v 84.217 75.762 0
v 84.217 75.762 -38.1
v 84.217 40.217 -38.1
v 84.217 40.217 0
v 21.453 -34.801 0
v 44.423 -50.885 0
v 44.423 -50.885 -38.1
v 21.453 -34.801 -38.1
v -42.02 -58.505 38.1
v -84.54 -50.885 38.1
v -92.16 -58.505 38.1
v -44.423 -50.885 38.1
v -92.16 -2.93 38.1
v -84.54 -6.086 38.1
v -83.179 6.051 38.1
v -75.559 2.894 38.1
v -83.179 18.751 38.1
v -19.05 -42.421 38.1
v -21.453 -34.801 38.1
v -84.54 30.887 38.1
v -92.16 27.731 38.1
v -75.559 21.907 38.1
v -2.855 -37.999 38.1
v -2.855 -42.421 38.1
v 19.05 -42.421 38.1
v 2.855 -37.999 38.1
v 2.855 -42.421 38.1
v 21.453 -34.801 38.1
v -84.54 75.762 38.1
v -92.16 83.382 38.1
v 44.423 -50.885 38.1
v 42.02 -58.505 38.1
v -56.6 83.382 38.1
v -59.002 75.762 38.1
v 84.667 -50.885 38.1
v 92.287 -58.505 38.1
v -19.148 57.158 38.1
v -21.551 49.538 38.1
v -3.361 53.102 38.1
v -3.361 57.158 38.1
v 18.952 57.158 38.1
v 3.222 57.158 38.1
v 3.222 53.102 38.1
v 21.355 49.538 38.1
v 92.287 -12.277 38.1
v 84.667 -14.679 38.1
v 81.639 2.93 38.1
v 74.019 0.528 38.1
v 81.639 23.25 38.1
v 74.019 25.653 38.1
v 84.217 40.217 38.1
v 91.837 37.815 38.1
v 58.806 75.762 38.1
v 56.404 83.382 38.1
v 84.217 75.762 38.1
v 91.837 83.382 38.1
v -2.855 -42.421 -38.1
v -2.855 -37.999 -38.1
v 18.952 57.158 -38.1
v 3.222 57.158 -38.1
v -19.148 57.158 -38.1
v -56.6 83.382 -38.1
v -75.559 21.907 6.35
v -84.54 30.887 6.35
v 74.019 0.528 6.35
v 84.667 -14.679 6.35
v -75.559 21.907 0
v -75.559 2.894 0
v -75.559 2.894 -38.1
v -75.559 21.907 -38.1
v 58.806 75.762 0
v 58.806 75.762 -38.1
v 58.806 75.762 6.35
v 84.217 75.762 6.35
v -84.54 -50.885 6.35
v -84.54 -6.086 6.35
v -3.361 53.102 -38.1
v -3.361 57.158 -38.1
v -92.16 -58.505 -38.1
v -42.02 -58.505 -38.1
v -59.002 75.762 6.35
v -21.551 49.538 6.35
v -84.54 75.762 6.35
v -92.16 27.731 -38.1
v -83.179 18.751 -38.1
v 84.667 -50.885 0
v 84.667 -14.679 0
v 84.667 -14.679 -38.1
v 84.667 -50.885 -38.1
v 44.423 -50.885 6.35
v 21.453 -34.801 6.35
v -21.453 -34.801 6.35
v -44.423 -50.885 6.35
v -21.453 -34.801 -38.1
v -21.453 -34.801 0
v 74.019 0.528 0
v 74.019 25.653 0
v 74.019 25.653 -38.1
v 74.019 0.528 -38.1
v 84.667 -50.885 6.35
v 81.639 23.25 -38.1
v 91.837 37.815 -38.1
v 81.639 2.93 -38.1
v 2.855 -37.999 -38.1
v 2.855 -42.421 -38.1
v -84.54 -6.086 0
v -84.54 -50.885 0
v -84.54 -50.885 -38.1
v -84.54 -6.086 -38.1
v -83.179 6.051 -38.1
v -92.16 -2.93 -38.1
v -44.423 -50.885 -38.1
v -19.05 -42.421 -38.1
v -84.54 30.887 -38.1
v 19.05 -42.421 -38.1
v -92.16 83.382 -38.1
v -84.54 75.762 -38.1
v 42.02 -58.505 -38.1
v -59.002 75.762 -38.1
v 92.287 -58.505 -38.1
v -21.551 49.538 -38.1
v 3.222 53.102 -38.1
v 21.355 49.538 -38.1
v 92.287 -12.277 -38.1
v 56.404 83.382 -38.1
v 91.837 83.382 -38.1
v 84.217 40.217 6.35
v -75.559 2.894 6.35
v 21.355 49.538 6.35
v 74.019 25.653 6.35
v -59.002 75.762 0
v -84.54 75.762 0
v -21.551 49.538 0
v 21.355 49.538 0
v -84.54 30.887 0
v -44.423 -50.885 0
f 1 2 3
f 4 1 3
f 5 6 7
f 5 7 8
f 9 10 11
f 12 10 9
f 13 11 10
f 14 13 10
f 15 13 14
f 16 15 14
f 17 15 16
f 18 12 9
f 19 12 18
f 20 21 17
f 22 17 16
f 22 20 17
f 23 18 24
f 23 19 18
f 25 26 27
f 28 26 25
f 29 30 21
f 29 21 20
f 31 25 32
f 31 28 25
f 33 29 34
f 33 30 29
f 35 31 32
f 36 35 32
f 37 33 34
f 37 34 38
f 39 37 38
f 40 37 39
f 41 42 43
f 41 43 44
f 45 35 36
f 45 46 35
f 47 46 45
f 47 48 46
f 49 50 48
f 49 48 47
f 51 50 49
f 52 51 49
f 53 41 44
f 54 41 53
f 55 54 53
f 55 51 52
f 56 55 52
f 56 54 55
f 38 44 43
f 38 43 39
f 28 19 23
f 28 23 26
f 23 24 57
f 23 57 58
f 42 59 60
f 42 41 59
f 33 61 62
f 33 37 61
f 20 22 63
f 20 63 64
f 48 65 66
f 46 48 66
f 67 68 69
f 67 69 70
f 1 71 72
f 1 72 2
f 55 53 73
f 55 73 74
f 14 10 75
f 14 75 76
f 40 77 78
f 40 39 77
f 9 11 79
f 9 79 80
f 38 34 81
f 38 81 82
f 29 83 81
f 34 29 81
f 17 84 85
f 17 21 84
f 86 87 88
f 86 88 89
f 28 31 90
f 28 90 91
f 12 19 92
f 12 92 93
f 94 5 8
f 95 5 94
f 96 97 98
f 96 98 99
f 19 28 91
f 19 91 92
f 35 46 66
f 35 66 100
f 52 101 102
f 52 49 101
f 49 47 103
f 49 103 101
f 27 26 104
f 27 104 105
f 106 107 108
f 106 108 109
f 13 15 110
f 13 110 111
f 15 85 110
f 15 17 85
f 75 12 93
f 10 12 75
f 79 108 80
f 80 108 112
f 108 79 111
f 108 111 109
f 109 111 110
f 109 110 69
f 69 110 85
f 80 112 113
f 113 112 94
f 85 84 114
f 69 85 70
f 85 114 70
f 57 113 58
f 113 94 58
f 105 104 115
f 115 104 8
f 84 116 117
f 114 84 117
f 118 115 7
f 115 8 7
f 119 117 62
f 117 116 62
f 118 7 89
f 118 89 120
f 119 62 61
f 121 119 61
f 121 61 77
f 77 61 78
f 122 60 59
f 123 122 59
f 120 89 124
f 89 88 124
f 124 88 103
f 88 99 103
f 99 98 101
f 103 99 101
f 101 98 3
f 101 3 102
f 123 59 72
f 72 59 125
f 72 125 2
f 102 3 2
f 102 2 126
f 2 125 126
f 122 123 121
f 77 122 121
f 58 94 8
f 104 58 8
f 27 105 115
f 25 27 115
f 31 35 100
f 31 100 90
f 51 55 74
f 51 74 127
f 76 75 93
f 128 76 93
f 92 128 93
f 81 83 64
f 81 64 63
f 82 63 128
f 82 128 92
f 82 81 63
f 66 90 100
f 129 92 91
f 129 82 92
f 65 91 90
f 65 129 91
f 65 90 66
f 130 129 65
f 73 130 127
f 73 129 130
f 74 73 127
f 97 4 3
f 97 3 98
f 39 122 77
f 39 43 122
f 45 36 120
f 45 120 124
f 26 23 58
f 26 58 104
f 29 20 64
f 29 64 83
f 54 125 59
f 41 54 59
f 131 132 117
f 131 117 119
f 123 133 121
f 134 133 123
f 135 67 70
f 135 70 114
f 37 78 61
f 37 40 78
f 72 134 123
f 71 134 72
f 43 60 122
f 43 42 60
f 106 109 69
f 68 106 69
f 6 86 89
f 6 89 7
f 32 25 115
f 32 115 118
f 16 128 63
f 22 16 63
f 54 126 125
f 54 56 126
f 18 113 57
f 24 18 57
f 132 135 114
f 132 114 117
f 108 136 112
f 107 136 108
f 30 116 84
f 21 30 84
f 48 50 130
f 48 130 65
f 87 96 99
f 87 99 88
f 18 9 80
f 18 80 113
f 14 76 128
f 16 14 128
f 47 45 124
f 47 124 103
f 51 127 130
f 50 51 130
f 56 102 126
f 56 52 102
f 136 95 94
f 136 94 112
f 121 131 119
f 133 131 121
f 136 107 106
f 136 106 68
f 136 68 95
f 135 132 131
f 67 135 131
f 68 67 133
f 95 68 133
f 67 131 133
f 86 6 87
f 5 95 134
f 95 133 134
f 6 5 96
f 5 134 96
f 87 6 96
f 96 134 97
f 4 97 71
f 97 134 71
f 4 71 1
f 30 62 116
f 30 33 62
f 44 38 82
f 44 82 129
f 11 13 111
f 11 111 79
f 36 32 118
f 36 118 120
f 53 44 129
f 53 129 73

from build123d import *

# Parameters (mm, degrees)
F1_DEPTH = 38.1
F2_DEPTH = 6.35


with BuildPart() as f1:
    # F0 (on Top) → F1 (new body, symmetric)
    with BuildSketch(Plane.XY):
        Polygon((-83.179305, 18.750736), (-83.179305, 6.050736), (-92.159561, -2.92952), (-92.159561, -58.50472), (-42.019961, -58.50472), (-19.05, -42.42098), (-2.855429, -42.42098), (-2.855429, -37.99941), (2.855429, -37.99941), (2.855429, -42.42098), (19.05, -42.42098), (42.019961, -58.50472), (92.286561, -58.50472), (92.286561, -12.27672), (81.638513, 2.930269), (81.638513, 23.250269), (91.836702, 37.814792), (91.836702, 83.382392), (56.403702, 83.382392), (18.95207, 57.158478), (3.221597, 57.158478), (3.221597, 53.102199), (-3.36058, 53.102199), (-3.36058, 57.158478), (-19.14793, 57.158478), (-56.599561, 83.382392), (-92.159561, 83.382392), (-92.159561, 27.730992), align=None)
        Polygon((-84.539561, 30.8873), (-84.539561, 75.762392), (-59.002138, 75.762392), (-21.550506, 49.538478), (21.354647, 49.538478), (58.806279, 75.762392), (84.216702, 75.762392), (84.216702, 40.217369), (74.018513, 25.652846), (74.018513, 0.527692), (84.666561, -14.679297), (84.666561, -50.88472), (44.422538, -50.88472), (21.452577, -34.80098), (-21.452577, -34.80098), (-44.422538, -50.88472), (-84.539561, -50.88472), (-84.539561, -6.085827), (-75.559305, 2.894429), (-75.559305, 21.907044), align=None, mode=Mode.SUBTRACT)
    extrude(amount=F1_DEPTH, both=True)

    # F0 (on Top) → F2 (join)
    with BuildSketch(Plane.XY):
        Polygon((-59.002138, 75.762392), (-84.539561, 75.762392), (-84.539561, 30.8873), (-75.559305, 21.907044), (-75.559305, 2.894429), (-84.539561, -6.085827), (-84.539561, -50.88472), (-44.422538, -50.88472), (-21.452577, -34.80098), (21.452577, -34.80098), (44.422538, -50.88472), (84.666561, -50.88472), (84.666561, -14.679297), (74.018513, 0.527692), (74.018513, 25.652846), (84.216702, 40.217369), (84.216702, 75.762392), (58.806279, 75.762392), (21.354647, 49.538478), (-21.550506, 49.538478), align=None)
    extrude(amount=F2_DEPTH)


solid = f1.part
